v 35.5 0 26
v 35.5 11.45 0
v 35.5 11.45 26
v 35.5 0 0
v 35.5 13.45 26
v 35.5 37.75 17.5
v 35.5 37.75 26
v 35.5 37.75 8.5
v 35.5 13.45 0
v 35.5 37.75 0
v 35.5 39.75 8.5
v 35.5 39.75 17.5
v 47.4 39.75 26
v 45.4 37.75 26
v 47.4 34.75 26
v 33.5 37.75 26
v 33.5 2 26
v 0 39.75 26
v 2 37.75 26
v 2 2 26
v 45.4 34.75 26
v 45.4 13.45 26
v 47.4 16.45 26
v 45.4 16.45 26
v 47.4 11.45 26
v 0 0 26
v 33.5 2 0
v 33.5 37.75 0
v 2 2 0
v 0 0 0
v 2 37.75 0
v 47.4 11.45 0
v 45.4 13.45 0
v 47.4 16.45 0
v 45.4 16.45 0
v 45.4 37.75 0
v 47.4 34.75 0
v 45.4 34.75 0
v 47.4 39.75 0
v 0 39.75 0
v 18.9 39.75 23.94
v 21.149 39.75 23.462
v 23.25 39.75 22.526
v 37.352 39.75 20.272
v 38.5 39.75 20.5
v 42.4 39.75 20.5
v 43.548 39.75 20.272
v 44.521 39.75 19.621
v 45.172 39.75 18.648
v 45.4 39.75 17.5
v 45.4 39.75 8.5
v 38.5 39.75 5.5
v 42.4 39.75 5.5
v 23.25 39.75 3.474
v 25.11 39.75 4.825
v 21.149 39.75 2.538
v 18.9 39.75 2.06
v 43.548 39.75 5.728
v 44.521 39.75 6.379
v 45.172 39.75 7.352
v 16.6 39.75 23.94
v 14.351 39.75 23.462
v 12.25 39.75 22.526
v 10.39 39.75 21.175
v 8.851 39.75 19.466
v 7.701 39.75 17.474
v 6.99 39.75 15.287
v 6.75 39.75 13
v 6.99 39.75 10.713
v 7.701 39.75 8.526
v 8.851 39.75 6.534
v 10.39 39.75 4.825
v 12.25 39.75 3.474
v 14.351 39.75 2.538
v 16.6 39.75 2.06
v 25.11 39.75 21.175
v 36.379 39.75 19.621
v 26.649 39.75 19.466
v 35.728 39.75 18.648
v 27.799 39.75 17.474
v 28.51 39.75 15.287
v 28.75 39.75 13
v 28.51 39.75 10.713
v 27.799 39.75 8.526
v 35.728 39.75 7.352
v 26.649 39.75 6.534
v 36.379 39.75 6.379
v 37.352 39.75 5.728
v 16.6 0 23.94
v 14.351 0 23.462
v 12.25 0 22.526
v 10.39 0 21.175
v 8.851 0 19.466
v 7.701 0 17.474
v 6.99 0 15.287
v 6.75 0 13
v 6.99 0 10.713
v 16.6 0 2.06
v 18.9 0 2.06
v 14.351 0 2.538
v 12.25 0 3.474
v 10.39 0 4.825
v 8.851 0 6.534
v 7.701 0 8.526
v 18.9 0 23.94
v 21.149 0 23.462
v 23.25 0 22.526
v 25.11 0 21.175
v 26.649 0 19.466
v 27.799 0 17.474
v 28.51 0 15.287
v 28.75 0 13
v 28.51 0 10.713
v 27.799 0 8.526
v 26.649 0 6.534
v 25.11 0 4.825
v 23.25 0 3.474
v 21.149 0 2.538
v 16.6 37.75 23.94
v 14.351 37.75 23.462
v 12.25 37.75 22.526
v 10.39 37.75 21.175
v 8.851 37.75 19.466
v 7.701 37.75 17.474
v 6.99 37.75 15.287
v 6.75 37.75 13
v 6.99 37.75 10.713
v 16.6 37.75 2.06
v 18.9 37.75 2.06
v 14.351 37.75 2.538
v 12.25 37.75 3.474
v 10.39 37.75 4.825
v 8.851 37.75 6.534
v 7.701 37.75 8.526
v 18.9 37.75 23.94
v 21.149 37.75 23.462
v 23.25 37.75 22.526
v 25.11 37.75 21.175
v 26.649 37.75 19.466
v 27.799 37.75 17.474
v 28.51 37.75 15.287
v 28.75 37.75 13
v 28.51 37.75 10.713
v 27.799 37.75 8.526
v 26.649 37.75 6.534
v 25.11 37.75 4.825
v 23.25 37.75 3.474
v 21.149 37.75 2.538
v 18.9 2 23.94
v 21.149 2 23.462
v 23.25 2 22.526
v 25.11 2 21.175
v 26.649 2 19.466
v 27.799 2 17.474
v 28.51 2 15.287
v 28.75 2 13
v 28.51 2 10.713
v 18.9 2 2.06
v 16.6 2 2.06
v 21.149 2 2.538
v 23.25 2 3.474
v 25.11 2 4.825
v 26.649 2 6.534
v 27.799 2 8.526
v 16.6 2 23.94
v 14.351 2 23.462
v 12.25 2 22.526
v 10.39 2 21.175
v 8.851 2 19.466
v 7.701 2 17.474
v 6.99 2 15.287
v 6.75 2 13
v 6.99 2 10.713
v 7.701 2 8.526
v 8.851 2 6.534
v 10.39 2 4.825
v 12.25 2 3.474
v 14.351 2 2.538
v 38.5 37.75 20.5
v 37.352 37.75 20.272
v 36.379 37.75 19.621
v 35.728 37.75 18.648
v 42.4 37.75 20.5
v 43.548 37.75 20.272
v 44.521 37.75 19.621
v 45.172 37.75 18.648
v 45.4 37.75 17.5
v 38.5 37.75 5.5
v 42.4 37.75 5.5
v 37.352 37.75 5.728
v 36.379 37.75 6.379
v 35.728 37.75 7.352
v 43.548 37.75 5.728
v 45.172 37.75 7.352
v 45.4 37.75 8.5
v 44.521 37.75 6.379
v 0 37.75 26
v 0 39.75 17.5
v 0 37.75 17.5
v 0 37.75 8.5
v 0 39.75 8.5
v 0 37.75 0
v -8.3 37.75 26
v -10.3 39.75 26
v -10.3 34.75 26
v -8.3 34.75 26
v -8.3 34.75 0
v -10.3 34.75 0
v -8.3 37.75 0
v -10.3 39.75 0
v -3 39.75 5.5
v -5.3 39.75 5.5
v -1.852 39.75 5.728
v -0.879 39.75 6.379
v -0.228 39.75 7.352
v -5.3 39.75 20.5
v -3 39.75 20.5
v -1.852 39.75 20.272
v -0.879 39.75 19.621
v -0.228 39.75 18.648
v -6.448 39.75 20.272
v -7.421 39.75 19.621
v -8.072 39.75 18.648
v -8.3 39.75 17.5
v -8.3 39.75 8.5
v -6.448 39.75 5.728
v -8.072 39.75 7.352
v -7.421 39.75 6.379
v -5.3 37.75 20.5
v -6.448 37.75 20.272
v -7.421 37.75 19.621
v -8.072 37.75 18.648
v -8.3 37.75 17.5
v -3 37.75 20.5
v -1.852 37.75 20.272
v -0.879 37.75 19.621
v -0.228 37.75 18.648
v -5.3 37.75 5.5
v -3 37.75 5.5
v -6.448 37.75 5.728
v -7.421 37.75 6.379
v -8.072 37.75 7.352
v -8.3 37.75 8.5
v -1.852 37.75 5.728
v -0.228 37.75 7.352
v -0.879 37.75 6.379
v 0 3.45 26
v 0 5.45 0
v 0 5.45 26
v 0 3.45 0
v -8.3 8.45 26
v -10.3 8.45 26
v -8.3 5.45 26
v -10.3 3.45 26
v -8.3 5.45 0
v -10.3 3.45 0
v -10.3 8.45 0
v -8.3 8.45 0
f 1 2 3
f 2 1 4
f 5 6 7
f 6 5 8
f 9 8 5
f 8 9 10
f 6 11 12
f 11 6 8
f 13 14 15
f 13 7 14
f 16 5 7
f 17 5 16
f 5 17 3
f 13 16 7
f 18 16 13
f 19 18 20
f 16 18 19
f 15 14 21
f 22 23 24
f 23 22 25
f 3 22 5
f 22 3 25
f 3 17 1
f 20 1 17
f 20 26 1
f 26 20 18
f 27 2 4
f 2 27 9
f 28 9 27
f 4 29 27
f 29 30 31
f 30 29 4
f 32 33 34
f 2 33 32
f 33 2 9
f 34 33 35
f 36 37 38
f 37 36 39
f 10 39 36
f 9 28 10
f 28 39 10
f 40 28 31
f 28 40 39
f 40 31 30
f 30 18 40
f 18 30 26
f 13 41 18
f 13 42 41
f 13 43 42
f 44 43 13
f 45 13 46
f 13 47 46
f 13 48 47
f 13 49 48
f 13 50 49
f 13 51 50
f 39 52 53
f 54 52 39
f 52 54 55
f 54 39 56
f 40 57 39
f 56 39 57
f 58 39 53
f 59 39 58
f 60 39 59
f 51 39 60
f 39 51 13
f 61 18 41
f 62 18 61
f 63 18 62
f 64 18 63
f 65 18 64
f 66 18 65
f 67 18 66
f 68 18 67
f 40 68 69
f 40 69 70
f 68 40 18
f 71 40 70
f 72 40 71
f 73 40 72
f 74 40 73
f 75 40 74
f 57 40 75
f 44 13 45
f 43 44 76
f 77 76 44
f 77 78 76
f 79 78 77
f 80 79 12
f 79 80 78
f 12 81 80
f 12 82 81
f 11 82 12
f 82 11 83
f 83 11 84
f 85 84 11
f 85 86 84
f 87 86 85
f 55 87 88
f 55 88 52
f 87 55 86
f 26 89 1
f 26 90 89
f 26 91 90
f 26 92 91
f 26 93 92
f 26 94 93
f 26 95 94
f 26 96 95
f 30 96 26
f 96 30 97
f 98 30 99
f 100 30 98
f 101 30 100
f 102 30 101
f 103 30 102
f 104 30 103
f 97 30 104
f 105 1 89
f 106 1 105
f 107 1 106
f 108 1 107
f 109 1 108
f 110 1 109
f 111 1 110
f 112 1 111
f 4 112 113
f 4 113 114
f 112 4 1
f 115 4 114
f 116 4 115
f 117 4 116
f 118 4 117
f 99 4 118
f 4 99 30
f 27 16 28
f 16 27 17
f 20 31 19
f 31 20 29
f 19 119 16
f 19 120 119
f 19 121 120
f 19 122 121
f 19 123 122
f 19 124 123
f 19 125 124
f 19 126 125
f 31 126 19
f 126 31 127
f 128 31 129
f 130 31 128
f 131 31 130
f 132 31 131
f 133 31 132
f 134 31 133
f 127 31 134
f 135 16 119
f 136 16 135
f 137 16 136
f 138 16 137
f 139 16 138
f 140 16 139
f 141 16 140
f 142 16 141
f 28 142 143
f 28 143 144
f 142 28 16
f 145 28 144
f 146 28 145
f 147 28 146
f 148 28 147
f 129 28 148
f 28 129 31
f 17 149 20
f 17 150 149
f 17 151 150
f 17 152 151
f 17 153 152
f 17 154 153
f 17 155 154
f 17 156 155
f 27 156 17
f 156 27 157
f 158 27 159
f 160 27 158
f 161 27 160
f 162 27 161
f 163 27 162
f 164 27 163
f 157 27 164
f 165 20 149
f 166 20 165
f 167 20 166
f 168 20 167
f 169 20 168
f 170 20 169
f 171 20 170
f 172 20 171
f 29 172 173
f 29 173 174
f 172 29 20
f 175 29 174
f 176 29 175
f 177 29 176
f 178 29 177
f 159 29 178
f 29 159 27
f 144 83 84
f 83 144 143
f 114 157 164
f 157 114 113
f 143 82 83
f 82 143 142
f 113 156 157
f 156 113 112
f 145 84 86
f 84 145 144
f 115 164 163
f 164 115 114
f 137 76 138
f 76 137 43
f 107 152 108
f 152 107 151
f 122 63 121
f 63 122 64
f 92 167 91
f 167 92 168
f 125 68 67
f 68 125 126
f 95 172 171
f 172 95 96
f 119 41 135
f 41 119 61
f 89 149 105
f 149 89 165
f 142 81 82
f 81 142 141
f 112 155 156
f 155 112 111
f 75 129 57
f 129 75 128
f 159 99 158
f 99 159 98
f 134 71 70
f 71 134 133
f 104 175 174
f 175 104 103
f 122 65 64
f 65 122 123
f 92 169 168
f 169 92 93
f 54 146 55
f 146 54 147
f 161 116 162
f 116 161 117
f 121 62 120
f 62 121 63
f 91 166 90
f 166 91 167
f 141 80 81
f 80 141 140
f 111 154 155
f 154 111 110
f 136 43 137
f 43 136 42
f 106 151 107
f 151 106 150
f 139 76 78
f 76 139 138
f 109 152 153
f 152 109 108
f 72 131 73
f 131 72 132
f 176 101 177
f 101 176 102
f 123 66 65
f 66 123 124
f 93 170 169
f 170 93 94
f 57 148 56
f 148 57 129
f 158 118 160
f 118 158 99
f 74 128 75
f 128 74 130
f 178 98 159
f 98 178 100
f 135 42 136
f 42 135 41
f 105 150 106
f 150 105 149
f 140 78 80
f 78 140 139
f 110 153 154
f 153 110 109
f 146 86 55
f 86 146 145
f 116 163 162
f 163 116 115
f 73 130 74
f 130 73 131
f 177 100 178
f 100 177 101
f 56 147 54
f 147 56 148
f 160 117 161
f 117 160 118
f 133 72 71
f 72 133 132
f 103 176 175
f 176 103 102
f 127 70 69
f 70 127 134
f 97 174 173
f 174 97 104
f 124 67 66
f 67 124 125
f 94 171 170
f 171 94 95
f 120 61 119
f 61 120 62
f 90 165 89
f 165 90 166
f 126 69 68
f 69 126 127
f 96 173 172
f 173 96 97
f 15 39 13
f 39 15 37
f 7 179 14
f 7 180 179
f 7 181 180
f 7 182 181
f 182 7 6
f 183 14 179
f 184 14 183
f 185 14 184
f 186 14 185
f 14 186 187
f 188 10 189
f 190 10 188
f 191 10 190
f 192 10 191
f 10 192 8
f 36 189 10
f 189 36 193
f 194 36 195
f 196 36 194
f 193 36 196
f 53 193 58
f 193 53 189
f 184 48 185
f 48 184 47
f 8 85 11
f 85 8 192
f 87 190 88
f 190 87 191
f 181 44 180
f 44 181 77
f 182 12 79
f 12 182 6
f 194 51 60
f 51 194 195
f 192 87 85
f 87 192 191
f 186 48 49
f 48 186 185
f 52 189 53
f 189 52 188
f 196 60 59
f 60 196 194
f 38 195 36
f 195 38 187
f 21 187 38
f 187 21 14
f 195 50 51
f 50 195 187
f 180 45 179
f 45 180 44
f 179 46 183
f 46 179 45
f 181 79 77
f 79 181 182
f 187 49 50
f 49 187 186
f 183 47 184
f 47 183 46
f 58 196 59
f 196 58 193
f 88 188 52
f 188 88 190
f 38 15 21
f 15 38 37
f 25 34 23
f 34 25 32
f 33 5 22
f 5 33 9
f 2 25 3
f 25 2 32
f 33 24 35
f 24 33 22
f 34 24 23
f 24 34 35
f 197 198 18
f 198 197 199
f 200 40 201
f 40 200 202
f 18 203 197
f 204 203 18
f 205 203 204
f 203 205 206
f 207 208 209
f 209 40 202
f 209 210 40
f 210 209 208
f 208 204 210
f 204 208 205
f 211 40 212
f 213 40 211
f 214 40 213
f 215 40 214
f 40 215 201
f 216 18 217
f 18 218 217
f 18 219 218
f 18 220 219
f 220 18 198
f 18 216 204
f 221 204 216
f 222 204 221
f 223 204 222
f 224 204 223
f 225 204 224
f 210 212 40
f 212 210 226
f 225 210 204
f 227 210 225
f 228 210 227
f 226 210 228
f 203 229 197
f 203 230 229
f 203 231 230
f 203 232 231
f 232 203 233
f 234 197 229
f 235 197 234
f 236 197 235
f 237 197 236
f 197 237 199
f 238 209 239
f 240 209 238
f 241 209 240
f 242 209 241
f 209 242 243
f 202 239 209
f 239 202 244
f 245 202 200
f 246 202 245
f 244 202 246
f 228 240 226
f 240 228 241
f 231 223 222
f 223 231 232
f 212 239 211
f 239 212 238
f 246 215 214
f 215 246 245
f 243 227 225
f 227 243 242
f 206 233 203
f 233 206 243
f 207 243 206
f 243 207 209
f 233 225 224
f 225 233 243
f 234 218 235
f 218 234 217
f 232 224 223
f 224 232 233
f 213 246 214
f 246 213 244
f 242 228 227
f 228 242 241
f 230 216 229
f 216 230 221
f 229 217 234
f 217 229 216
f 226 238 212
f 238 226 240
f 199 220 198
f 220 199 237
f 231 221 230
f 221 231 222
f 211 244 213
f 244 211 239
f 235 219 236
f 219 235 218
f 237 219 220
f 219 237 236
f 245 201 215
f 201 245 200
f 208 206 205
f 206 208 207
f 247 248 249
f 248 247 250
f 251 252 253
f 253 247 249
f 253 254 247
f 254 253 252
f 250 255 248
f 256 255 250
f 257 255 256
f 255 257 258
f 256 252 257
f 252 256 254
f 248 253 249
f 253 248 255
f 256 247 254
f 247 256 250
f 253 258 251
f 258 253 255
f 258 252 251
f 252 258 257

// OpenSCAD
union() {
	difference() {
		cube(size = [35.5000000000, 39.7500000000, 26]);
		translate(v = [2, 2, -1]) {
			cube(size = [31.5000000000, 35.7500000000, 28]);
		}
		translate(v = [17.7500000000, -0.0100000000, 13.0000000000]) {
			rotate(a = -90, v = [1, 0, 0]) {
				cylinder(h = 39.7700000000, r = 11.0000000000);
			}
		}
	}
	translate(v = [35.5000000000, 11.4500000000, 0]) {
		union() {
			cube(size = [11.9000000000, 2, 26]);
			translate(v = [9.9000000000, 0, 0]) {
				cube(size = [2, 5, 26]);
			}
			translate(v = [0, 26.3000000000]) {
				difference() {
					cube(size = [11.9000000000, 2, 26]);
					translate(v = [0, -0.0100000000, 5.5000000000]) {
						translate(v = [3, 0, 3]) {
							minkowski() {
								cube(size = [3.9000000000, 2.0200000000, 9]);
								rotate(a = 90, v = [1, 0, 0]) {
									cylinder($fn = 16, h = 2, r = 3);
								}
							}
						}
					}
				}
				translate(v = [9.9000000000, -3, 0]) {
					cube(size = [2, 5, 26]);
				}
			}
		}
	}
	translate(v = [-10.3000000000, 3.4500000000, 0]) {
		union() {
			cube(size = [10.3000000000, 2, 26]);
			translate(v = [0, 0, 0]) {
				cube(size = [2, 5, 26]);
			}
			translate(v = [0, 34.3000000000]) {
				difference() {
					cube(size = [10.3000000000, 2, 26]);
					translate(v = [2, -0.0100000000, 5.5000000000]) {
						translate(v = [3, 0, 3]) {
							minkowski() {
								cube(size = [2.3000000000, 2.0200000000, 9]);
								rotate(a = 90, v = [1, 0, 0]) {
									cylinder($fn = 16, h = 2, r = 3);
								}
							}
						}
					}
				}
				translate(v = [0, -3, 0]) {
					cube(size = [2, 5, 26]);
				}
			}
		}
	}
}
